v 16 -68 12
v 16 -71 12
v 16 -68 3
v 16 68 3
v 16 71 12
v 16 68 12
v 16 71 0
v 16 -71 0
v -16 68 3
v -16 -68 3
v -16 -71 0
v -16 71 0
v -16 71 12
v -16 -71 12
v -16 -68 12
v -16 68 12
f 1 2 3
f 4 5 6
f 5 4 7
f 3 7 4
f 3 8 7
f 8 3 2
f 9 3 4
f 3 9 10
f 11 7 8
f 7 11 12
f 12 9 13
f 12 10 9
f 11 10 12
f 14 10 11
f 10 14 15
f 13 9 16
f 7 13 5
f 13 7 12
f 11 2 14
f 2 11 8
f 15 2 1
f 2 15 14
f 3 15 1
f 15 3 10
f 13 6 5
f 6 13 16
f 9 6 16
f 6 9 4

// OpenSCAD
$fn = 20;

Width = 32;

// Methods
module Holes (x, y) {    
    translate ([x, y, 1.5])
    cylinder (r = 4, h = 2.5);
    
    translate ([x, y, 0])
	cylinder (r = 2, h = 5 + 1);
}

//Post (0, 0, 50);

difference() {
    translate([0, 0, 1.5]) 
    cube ([Width, 142, 3], center = true);
}

translate([-(Width / 2), -71, 0]) 
cube ([Width, 3, 12]);

translate([-(Width / 2), 68, 0]) 
cube ([Width, 3, 12]);
